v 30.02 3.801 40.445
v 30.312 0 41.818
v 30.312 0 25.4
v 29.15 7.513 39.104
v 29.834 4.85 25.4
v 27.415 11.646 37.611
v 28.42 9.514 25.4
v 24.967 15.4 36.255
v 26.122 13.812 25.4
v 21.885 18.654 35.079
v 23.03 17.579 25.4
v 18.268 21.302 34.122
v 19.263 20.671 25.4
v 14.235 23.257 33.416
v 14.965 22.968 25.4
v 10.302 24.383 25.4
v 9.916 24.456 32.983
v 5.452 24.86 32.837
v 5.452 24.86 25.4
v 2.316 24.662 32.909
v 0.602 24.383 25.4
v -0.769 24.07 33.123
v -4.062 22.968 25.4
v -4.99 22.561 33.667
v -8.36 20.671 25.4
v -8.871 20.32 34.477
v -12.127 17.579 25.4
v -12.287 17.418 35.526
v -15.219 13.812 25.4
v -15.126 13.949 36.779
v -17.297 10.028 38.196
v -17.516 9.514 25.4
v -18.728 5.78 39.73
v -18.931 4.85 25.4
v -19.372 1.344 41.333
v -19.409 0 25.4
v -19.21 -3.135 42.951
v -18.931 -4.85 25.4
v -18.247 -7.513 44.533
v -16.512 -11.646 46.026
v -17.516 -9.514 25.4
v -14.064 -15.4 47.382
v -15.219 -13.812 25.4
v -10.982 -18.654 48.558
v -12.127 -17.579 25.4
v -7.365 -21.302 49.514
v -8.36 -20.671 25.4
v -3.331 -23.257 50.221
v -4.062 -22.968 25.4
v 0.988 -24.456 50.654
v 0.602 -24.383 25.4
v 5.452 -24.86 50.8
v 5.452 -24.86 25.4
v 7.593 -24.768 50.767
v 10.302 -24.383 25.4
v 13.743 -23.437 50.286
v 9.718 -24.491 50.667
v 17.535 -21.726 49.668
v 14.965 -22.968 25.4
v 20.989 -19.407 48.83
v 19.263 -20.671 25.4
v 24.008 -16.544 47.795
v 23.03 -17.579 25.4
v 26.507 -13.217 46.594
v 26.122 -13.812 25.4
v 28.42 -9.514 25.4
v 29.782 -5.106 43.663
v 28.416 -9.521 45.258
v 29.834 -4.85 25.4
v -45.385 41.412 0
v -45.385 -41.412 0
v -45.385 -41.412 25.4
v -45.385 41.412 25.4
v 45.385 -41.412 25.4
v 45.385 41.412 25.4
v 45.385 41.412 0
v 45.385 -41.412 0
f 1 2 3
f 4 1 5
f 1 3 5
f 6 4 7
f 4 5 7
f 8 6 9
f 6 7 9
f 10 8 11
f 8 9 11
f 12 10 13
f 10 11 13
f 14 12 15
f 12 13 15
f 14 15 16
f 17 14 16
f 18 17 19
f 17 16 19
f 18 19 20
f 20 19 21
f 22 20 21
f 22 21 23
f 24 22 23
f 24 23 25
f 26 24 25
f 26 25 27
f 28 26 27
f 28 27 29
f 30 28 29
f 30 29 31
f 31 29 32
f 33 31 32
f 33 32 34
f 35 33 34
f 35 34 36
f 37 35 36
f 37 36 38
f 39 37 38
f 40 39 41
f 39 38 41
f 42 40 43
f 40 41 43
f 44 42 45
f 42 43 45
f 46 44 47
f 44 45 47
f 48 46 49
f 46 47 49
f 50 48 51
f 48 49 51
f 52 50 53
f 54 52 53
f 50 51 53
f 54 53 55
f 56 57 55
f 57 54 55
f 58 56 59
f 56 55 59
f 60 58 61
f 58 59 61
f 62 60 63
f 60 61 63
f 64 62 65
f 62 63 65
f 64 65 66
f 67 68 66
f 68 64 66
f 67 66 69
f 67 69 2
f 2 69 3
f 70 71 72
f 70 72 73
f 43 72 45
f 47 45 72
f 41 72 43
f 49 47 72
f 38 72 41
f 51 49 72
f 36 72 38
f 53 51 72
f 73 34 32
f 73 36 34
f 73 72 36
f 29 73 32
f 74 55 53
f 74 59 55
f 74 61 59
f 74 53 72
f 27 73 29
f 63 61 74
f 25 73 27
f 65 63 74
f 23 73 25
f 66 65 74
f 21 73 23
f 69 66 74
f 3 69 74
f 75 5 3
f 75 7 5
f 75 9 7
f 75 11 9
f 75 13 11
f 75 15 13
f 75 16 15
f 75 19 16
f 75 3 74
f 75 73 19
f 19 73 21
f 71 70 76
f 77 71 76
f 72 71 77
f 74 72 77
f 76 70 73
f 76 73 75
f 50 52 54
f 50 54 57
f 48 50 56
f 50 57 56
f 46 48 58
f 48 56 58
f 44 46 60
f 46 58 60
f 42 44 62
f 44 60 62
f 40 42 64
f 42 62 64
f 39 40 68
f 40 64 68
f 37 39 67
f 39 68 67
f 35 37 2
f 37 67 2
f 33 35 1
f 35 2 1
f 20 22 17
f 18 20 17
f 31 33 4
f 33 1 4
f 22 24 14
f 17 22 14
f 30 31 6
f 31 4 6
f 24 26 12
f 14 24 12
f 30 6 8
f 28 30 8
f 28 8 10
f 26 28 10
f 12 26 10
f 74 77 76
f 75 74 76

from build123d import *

# Parameters (mm, degrees)
F0_W     = 90.770632
F0_H     = 82.823328
F1_DEPTH = 25.4
F2_R     = 24.860346
F3_DEPTH = 25.4
F5_DEPTH = 90.771632


with BuildPart() as f1:
    # F0 (on Top) → F1 (new body)
    with BuildSketch(Plane.XY):
        Rectangle(F0_W, F0_H)
    extrude(amount=F1_DEPTH)

    # F2 (on face) → F3 (join)
    with BuildSketch(Plane.XY.offset(25.4)):
        with Locations((5.451556, 0)):
            Circle(F2_R)
    extrude(amount=F3_DEPTH)

    # F4 (on face) → F5 (cut, through all)
    with BuildSketch(Plane.YZ.offset(45.385316)):
        Polygon((24.860346, 50.8), (-24.860346, 50.8), (24.860346, 32.836914), align=None)
    extrude(amount=-F5_DEPTH, mode=Mode.SUBTRACT)


solid = f1.part
